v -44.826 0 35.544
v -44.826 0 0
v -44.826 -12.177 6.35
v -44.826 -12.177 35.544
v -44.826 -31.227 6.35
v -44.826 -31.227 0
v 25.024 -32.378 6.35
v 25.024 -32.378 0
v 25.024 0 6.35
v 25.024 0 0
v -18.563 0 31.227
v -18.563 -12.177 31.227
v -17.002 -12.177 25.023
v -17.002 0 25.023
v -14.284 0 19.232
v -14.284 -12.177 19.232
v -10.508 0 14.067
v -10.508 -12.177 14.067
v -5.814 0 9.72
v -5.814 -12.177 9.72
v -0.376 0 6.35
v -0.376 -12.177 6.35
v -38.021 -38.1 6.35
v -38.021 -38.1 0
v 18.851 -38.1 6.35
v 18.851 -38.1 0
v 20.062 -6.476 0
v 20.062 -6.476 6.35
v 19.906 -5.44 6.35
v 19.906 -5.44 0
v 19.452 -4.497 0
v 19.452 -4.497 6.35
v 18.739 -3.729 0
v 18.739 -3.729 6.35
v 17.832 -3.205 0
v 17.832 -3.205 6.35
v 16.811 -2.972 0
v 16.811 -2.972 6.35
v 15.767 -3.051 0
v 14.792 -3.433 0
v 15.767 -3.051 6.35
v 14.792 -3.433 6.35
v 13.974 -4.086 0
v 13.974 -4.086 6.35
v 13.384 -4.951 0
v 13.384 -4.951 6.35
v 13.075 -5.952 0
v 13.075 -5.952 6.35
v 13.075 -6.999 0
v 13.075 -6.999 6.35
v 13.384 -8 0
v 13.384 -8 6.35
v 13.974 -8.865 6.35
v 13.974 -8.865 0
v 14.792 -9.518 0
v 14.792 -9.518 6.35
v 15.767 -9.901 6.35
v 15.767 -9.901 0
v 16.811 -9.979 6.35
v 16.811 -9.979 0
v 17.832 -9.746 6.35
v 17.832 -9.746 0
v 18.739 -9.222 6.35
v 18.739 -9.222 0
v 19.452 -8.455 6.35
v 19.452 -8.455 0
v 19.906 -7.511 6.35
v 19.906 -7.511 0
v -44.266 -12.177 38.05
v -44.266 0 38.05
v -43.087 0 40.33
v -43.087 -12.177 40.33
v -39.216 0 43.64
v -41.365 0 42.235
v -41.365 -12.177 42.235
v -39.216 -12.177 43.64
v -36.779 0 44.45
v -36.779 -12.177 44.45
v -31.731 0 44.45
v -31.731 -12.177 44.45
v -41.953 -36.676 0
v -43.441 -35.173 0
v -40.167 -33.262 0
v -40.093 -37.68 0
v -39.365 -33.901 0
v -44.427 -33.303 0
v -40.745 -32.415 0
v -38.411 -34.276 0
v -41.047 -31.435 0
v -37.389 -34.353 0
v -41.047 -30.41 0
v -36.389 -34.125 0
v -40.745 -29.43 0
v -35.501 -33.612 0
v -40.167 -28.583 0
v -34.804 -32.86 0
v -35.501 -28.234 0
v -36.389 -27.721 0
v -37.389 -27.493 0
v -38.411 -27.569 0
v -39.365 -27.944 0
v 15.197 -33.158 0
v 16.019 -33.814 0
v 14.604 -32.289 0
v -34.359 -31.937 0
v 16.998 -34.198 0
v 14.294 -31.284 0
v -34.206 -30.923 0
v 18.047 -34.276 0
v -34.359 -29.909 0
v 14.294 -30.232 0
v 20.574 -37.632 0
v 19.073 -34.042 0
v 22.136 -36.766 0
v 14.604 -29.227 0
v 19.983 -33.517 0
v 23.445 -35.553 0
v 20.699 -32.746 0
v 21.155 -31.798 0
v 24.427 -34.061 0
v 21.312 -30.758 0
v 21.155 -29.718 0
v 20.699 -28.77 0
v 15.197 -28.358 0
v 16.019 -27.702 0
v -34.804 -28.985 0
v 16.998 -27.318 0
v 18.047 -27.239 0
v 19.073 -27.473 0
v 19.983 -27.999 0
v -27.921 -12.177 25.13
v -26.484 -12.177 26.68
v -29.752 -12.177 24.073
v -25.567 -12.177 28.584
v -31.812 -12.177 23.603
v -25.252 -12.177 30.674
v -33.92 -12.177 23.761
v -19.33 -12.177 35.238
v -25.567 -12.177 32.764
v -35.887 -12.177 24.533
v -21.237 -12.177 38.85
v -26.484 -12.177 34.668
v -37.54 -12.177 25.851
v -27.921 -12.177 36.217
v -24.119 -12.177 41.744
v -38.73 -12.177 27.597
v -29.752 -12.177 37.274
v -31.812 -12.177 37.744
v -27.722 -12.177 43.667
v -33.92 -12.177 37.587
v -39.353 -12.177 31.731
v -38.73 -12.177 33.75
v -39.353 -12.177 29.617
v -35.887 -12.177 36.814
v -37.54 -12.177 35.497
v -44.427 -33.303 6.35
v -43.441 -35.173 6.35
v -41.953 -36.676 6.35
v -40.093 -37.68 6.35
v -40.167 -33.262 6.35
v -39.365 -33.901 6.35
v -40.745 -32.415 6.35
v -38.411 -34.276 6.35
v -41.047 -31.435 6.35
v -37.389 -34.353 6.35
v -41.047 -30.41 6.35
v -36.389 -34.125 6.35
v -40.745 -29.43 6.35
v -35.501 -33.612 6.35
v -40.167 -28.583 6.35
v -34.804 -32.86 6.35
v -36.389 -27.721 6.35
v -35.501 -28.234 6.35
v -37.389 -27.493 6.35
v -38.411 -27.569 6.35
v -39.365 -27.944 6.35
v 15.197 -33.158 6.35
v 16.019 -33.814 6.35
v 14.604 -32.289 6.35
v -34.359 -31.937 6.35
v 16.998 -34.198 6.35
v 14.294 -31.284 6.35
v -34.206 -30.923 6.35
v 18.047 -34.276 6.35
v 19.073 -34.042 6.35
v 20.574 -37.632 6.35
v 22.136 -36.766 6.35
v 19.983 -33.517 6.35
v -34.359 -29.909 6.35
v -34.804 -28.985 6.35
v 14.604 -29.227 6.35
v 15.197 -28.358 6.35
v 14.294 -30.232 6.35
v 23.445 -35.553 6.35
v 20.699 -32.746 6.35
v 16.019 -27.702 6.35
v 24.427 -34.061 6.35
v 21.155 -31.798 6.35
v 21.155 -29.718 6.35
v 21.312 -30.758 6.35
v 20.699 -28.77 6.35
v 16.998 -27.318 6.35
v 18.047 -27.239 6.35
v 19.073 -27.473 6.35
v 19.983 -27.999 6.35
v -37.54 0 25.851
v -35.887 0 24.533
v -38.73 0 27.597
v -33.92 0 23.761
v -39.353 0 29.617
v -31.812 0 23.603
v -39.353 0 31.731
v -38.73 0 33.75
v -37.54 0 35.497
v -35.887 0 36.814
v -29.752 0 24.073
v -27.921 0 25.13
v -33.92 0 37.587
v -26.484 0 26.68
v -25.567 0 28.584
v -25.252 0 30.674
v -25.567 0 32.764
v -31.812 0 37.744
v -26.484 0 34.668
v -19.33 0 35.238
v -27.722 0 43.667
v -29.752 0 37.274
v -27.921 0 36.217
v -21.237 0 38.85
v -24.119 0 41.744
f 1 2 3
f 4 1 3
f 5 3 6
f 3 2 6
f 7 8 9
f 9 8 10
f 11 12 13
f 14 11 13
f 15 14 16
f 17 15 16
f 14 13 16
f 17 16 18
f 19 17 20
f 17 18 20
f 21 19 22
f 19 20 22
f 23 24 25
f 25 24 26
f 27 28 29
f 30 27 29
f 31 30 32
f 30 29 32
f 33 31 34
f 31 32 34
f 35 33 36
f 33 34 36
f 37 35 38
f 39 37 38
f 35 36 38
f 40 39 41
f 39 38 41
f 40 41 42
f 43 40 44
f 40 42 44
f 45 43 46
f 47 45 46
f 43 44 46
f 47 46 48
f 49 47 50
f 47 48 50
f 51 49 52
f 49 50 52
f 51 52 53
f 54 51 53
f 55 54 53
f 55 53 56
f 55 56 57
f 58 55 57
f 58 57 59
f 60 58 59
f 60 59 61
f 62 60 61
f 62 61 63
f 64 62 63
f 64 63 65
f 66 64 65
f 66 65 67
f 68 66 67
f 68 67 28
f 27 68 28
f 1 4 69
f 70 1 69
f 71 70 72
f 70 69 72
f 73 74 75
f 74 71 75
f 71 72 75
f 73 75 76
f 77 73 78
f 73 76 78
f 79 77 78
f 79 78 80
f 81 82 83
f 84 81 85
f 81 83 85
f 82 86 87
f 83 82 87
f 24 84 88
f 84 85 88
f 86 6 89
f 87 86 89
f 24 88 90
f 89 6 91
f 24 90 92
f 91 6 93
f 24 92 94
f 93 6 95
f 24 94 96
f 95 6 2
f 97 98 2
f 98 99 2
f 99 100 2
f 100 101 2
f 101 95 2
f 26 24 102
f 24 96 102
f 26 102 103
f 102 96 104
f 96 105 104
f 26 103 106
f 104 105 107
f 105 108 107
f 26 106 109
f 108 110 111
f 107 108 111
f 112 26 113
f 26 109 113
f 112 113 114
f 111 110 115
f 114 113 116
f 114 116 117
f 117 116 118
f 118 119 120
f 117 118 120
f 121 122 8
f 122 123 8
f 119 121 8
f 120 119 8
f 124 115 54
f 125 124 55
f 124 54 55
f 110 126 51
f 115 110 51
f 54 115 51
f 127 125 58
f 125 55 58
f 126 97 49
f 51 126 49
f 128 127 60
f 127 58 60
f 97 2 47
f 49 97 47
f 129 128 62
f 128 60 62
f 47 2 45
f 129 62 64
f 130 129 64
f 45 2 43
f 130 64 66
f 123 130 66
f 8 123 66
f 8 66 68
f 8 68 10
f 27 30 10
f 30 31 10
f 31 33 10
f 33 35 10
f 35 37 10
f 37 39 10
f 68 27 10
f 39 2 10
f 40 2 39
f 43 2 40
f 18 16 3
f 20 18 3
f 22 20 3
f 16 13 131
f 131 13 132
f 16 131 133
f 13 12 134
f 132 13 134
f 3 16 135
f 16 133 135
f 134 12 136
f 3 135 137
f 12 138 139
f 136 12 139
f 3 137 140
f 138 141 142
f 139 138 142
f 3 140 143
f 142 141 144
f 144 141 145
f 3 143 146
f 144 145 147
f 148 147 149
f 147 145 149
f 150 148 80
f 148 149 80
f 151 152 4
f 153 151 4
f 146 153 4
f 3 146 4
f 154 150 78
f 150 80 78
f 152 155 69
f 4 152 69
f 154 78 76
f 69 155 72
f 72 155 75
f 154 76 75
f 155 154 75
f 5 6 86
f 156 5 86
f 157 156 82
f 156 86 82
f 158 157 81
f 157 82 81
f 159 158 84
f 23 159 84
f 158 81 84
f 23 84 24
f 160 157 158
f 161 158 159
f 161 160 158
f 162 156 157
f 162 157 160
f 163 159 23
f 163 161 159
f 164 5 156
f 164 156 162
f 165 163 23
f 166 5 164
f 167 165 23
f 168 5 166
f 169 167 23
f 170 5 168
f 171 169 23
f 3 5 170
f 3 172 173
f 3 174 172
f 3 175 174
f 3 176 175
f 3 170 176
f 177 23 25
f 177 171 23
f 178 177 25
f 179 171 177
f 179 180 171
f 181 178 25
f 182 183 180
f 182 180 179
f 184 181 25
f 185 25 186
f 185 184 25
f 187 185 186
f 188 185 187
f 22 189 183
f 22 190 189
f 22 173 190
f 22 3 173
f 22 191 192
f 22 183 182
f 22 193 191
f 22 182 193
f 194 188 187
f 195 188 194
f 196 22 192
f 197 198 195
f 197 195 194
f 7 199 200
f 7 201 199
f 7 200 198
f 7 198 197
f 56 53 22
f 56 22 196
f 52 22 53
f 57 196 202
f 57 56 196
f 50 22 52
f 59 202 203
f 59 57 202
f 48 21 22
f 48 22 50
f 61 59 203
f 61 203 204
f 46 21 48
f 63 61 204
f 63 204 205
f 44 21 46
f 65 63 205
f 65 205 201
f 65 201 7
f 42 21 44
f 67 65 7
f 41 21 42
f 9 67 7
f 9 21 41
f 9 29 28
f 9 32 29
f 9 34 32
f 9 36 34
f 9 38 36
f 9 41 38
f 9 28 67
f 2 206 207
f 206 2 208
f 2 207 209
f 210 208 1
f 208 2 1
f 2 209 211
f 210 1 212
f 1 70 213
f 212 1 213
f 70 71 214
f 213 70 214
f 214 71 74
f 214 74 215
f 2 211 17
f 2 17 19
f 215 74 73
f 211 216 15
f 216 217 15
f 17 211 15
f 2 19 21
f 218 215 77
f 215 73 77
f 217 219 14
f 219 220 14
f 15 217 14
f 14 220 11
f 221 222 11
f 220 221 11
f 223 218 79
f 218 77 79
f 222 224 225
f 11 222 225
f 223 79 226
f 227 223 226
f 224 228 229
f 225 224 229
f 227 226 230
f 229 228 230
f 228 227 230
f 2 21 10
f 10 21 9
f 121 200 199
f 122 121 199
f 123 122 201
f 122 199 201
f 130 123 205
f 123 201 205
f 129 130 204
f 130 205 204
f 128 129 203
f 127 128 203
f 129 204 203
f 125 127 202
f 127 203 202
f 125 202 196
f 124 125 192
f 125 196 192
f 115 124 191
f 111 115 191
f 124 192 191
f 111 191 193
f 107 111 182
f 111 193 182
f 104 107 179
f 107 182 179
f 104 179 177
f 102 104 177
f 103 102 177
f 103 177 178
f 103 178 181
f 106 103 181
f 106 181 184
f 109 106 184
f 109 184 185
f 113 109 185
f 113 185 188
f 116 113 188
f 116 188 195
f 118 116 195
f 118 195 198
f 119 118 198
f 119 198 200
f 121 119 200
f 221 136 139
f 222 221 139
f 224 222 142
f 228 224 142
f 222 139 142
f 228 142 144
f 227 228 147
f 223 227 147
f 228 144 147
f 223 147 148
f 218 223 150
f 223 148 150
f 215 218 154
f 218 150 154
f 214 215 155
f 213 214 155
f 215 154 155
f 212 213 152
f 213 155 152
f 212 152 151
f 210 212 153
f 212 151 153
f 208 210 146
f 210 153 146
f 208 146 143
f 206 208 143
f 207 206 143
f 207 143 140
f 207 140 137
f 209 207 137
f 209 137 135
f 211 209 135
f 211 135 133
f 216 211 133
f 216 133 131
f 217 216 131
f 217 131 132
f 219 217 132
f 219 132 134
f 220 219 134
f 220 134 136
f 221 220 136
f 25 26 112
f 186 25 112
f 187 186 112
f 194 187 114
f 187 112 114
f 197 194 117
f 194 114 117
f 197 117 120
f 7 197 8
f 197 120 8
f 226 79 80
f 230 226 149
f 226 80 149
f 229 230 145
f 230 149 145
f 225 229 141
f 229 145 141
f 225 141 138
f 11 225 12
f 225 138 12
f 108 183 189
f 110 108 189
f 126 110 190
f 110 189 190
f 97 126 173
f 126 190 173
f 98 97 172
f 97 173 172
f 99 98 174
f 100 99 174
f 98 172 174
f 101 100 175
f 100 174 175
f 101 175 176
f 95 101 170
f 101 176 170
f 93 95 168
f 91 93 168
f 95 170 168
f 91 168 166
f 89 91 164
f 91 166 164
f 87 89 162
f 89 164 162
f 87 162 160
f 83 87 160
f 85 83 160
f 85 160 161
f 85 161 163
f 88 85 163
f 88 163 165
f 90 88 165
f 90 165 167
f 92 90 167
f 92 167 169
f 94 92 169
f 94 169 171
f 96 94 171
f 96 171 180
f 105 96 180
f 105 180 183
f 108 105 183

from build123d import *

# Parameters (mm, degrees)
F0_W      = 69.85
F0_H      = 44.45
F1_DEPTH  = 38.1
F3_DEPTH  = 44.451
F5_DEPTH  = 31.75
F6_DEPTH  = 5.08
F7_DEPTH  = 6.35
F8_DEPTH  = 5.08
F10_DEPTH = 12.1779236892
F11_R     = 7.0905060621
F12_DEPTH = 25.9240763108
F13_DEPTH = 38.102
F14_R     = 3.5131163542
F14_R_2   = 3.5285454021
F14_R_3   = 3.4395422414
F15_DEPTH = 6.351


with BuildPart() as f1:
    # F0 (on Front) → F1 (new body)
    with BuildSketch(Plane.XZ):
        with Locations((-9.9012593745, 22.225)):
            Rectangle(F0_W, F0_H)
    extrude(amount=F1_DEPTH)

    # F2 (on face) → F3 (cut, through all)
    with BuildSketch(Plane.XY.offset(44.45)):
        with BuildLine():
            ThreePointArc((-38.0205141645, -38.1), (-42.7526228642, -35.9796762697), (-44.8262593745, -31.2269236892))
            Line((-44.8262593745, -31.2269236892), (-44.8262593745, -38.1))
            Line((-44.8262593745, -38.1), (-38.0205141645, -38.1))
        make_face()
        with BuildLine():
            ThreePointArc((25.0237406255, -32.3781482875), (22.8273562196, -36.1989998927), (18.8512764871, -38.1))
            Line((18.8512764871, -38.1), (25.0237406255, -38.1))
            Line((25.0237406255, -38.1), (25.0237406255, -32.3781482875))
        make_face()
    extrude(amount=-F3_DEPTH, mode=Mode.SUBTRACT)

    # F4 (on face) → F5 (cut)
    with BuildSketch(Plane.XY.offset(44.45)):
        with BuildLine():
            Line((-0.3762593745, -12.1769236892), (-44.8262593745, -12.1769236892))
            Line((-44.8262593745, -12.1769236892), (-44.8262593745, -31.2269236892))
            ThreePointArc((-44.8262593745, -31.2269236892), (-42.7526228642, -35.9796762697), (-38.0205141645, -38.1))
            Line((-38.0205141645, -38.1), (18.8512764871, -38.1))
            ThreePointArc((18.8512764871, -38.1), (22.8273562196, -36.1989998927), (25.0237406255, -32.3781482875))
            Line((25.0237406255, -32.3781482875), (25.0237406255, 0))
            Line((25.0237406255, 0), (-0.3762593745, 0))
            Line((-0.3762593745, 0), (-0.3762593745, -12.1769236892))
        make_face()
    extrude(amount=-F5_DEPTH, mode=Mode.SUBTRACT)

    # F6 (add): a face of the model
    f6_faces = [f1.faces().sort_by_distance(p)[0] for p in [
        (-6.6136162869, -22.2162080718, 12.7),
    ]]
    extrude(f6_faces, amount=F6_DEPTH)

    # F7 (cut): a face of the model
    f7_faces = [f1.faces().sort_by_distance(p)[0] for p in [
        (-6.6136162869, -22.2162080718, 17.78),
    ]]
    extrude(f7_faces, amount=-F7_DEPTH, mode=Mode.SUBTRACT)

    # F8 (cut): a face of the model
    f8_faces = [f1.faces().sort_by_distance(p)[0] for p in [
        (-6.6136162869, -22.2162080718, 11.43),
    ]]
    extrude(f8_faces, amount=-F8_DEPTH, mode=Mode.SUBTRACT)

    # F9 (on face) → F10 (cut, through all)
    with BuildSketch(Plane.XZ.offset(12.1769236892)):
        with BuildLine():
            ThreePointArc((-44.8262593745, 35.5440117419), (-42.2872783605, 41.3383758962), (-36.7792046519, 44.45))
            Line((-36.7792046519, 44.45), (-44.8262593745, 44.45))
            Line((-44.8262593745, 44.45), (-44.8262593745, 35.5440117419))
        make_face()
        with BuildLine():
            Line((-0.3762593745, 44.45), (-31.7305137767, 44.45))
            ThreePointArc((-31.7305137767, 44.45), (-22.5706200379, 40.403916894), (-18.5634717345, 31.2269236892))
            ThreePointArc((-18.5634717345, 31.2269236892), (-12.5199705056, 16.5585677002), (-0.3762593745, 6.35))
            Line((-0.3762593745, 6.35), (-0.3762593745, 44.45))
        make_face()
    extrude(amount=-F10_DEPTH, mode=Mode.SUBTRACT)

    # F11 (on face) → F12 (join, through all)
    with BuildSketch(Plane.XZ.offset(12.1769236892)):
        with Locations((-32.3421357847, 30.6738090409)):
            Circle(F11_R)
    extrude(amount=F12_DEPTH)

    # F13 (cut, through all): a face of the model
    f13_faces = [f1.faces().sort_by_distance(p)[0] for p in [
        (-32.3421357847, -38.101, 30.6738090409),
    ]]
    extrude(f13_faces, amount=-F13_DEPTH, mode=Mode.SUBTRACT)

    # F14 (on face) → F15 (cut, through all)
    with BuildSketch(Plane.XY.offset(6.35)):
        with Locations((16.5488310158, -6.4756297506)):
            Circle(F14_R)
        with Locations((17.7833885895, -30.7578051752)):
            Circle(F14_R_2)
        with Locations((-37.6456809362, -30.9227637617)):
            Circle(F14_R_3)
    extrude(amount=-F15_DEPTH, mode=Mode.SUBTRACT)


solid = f1.part
